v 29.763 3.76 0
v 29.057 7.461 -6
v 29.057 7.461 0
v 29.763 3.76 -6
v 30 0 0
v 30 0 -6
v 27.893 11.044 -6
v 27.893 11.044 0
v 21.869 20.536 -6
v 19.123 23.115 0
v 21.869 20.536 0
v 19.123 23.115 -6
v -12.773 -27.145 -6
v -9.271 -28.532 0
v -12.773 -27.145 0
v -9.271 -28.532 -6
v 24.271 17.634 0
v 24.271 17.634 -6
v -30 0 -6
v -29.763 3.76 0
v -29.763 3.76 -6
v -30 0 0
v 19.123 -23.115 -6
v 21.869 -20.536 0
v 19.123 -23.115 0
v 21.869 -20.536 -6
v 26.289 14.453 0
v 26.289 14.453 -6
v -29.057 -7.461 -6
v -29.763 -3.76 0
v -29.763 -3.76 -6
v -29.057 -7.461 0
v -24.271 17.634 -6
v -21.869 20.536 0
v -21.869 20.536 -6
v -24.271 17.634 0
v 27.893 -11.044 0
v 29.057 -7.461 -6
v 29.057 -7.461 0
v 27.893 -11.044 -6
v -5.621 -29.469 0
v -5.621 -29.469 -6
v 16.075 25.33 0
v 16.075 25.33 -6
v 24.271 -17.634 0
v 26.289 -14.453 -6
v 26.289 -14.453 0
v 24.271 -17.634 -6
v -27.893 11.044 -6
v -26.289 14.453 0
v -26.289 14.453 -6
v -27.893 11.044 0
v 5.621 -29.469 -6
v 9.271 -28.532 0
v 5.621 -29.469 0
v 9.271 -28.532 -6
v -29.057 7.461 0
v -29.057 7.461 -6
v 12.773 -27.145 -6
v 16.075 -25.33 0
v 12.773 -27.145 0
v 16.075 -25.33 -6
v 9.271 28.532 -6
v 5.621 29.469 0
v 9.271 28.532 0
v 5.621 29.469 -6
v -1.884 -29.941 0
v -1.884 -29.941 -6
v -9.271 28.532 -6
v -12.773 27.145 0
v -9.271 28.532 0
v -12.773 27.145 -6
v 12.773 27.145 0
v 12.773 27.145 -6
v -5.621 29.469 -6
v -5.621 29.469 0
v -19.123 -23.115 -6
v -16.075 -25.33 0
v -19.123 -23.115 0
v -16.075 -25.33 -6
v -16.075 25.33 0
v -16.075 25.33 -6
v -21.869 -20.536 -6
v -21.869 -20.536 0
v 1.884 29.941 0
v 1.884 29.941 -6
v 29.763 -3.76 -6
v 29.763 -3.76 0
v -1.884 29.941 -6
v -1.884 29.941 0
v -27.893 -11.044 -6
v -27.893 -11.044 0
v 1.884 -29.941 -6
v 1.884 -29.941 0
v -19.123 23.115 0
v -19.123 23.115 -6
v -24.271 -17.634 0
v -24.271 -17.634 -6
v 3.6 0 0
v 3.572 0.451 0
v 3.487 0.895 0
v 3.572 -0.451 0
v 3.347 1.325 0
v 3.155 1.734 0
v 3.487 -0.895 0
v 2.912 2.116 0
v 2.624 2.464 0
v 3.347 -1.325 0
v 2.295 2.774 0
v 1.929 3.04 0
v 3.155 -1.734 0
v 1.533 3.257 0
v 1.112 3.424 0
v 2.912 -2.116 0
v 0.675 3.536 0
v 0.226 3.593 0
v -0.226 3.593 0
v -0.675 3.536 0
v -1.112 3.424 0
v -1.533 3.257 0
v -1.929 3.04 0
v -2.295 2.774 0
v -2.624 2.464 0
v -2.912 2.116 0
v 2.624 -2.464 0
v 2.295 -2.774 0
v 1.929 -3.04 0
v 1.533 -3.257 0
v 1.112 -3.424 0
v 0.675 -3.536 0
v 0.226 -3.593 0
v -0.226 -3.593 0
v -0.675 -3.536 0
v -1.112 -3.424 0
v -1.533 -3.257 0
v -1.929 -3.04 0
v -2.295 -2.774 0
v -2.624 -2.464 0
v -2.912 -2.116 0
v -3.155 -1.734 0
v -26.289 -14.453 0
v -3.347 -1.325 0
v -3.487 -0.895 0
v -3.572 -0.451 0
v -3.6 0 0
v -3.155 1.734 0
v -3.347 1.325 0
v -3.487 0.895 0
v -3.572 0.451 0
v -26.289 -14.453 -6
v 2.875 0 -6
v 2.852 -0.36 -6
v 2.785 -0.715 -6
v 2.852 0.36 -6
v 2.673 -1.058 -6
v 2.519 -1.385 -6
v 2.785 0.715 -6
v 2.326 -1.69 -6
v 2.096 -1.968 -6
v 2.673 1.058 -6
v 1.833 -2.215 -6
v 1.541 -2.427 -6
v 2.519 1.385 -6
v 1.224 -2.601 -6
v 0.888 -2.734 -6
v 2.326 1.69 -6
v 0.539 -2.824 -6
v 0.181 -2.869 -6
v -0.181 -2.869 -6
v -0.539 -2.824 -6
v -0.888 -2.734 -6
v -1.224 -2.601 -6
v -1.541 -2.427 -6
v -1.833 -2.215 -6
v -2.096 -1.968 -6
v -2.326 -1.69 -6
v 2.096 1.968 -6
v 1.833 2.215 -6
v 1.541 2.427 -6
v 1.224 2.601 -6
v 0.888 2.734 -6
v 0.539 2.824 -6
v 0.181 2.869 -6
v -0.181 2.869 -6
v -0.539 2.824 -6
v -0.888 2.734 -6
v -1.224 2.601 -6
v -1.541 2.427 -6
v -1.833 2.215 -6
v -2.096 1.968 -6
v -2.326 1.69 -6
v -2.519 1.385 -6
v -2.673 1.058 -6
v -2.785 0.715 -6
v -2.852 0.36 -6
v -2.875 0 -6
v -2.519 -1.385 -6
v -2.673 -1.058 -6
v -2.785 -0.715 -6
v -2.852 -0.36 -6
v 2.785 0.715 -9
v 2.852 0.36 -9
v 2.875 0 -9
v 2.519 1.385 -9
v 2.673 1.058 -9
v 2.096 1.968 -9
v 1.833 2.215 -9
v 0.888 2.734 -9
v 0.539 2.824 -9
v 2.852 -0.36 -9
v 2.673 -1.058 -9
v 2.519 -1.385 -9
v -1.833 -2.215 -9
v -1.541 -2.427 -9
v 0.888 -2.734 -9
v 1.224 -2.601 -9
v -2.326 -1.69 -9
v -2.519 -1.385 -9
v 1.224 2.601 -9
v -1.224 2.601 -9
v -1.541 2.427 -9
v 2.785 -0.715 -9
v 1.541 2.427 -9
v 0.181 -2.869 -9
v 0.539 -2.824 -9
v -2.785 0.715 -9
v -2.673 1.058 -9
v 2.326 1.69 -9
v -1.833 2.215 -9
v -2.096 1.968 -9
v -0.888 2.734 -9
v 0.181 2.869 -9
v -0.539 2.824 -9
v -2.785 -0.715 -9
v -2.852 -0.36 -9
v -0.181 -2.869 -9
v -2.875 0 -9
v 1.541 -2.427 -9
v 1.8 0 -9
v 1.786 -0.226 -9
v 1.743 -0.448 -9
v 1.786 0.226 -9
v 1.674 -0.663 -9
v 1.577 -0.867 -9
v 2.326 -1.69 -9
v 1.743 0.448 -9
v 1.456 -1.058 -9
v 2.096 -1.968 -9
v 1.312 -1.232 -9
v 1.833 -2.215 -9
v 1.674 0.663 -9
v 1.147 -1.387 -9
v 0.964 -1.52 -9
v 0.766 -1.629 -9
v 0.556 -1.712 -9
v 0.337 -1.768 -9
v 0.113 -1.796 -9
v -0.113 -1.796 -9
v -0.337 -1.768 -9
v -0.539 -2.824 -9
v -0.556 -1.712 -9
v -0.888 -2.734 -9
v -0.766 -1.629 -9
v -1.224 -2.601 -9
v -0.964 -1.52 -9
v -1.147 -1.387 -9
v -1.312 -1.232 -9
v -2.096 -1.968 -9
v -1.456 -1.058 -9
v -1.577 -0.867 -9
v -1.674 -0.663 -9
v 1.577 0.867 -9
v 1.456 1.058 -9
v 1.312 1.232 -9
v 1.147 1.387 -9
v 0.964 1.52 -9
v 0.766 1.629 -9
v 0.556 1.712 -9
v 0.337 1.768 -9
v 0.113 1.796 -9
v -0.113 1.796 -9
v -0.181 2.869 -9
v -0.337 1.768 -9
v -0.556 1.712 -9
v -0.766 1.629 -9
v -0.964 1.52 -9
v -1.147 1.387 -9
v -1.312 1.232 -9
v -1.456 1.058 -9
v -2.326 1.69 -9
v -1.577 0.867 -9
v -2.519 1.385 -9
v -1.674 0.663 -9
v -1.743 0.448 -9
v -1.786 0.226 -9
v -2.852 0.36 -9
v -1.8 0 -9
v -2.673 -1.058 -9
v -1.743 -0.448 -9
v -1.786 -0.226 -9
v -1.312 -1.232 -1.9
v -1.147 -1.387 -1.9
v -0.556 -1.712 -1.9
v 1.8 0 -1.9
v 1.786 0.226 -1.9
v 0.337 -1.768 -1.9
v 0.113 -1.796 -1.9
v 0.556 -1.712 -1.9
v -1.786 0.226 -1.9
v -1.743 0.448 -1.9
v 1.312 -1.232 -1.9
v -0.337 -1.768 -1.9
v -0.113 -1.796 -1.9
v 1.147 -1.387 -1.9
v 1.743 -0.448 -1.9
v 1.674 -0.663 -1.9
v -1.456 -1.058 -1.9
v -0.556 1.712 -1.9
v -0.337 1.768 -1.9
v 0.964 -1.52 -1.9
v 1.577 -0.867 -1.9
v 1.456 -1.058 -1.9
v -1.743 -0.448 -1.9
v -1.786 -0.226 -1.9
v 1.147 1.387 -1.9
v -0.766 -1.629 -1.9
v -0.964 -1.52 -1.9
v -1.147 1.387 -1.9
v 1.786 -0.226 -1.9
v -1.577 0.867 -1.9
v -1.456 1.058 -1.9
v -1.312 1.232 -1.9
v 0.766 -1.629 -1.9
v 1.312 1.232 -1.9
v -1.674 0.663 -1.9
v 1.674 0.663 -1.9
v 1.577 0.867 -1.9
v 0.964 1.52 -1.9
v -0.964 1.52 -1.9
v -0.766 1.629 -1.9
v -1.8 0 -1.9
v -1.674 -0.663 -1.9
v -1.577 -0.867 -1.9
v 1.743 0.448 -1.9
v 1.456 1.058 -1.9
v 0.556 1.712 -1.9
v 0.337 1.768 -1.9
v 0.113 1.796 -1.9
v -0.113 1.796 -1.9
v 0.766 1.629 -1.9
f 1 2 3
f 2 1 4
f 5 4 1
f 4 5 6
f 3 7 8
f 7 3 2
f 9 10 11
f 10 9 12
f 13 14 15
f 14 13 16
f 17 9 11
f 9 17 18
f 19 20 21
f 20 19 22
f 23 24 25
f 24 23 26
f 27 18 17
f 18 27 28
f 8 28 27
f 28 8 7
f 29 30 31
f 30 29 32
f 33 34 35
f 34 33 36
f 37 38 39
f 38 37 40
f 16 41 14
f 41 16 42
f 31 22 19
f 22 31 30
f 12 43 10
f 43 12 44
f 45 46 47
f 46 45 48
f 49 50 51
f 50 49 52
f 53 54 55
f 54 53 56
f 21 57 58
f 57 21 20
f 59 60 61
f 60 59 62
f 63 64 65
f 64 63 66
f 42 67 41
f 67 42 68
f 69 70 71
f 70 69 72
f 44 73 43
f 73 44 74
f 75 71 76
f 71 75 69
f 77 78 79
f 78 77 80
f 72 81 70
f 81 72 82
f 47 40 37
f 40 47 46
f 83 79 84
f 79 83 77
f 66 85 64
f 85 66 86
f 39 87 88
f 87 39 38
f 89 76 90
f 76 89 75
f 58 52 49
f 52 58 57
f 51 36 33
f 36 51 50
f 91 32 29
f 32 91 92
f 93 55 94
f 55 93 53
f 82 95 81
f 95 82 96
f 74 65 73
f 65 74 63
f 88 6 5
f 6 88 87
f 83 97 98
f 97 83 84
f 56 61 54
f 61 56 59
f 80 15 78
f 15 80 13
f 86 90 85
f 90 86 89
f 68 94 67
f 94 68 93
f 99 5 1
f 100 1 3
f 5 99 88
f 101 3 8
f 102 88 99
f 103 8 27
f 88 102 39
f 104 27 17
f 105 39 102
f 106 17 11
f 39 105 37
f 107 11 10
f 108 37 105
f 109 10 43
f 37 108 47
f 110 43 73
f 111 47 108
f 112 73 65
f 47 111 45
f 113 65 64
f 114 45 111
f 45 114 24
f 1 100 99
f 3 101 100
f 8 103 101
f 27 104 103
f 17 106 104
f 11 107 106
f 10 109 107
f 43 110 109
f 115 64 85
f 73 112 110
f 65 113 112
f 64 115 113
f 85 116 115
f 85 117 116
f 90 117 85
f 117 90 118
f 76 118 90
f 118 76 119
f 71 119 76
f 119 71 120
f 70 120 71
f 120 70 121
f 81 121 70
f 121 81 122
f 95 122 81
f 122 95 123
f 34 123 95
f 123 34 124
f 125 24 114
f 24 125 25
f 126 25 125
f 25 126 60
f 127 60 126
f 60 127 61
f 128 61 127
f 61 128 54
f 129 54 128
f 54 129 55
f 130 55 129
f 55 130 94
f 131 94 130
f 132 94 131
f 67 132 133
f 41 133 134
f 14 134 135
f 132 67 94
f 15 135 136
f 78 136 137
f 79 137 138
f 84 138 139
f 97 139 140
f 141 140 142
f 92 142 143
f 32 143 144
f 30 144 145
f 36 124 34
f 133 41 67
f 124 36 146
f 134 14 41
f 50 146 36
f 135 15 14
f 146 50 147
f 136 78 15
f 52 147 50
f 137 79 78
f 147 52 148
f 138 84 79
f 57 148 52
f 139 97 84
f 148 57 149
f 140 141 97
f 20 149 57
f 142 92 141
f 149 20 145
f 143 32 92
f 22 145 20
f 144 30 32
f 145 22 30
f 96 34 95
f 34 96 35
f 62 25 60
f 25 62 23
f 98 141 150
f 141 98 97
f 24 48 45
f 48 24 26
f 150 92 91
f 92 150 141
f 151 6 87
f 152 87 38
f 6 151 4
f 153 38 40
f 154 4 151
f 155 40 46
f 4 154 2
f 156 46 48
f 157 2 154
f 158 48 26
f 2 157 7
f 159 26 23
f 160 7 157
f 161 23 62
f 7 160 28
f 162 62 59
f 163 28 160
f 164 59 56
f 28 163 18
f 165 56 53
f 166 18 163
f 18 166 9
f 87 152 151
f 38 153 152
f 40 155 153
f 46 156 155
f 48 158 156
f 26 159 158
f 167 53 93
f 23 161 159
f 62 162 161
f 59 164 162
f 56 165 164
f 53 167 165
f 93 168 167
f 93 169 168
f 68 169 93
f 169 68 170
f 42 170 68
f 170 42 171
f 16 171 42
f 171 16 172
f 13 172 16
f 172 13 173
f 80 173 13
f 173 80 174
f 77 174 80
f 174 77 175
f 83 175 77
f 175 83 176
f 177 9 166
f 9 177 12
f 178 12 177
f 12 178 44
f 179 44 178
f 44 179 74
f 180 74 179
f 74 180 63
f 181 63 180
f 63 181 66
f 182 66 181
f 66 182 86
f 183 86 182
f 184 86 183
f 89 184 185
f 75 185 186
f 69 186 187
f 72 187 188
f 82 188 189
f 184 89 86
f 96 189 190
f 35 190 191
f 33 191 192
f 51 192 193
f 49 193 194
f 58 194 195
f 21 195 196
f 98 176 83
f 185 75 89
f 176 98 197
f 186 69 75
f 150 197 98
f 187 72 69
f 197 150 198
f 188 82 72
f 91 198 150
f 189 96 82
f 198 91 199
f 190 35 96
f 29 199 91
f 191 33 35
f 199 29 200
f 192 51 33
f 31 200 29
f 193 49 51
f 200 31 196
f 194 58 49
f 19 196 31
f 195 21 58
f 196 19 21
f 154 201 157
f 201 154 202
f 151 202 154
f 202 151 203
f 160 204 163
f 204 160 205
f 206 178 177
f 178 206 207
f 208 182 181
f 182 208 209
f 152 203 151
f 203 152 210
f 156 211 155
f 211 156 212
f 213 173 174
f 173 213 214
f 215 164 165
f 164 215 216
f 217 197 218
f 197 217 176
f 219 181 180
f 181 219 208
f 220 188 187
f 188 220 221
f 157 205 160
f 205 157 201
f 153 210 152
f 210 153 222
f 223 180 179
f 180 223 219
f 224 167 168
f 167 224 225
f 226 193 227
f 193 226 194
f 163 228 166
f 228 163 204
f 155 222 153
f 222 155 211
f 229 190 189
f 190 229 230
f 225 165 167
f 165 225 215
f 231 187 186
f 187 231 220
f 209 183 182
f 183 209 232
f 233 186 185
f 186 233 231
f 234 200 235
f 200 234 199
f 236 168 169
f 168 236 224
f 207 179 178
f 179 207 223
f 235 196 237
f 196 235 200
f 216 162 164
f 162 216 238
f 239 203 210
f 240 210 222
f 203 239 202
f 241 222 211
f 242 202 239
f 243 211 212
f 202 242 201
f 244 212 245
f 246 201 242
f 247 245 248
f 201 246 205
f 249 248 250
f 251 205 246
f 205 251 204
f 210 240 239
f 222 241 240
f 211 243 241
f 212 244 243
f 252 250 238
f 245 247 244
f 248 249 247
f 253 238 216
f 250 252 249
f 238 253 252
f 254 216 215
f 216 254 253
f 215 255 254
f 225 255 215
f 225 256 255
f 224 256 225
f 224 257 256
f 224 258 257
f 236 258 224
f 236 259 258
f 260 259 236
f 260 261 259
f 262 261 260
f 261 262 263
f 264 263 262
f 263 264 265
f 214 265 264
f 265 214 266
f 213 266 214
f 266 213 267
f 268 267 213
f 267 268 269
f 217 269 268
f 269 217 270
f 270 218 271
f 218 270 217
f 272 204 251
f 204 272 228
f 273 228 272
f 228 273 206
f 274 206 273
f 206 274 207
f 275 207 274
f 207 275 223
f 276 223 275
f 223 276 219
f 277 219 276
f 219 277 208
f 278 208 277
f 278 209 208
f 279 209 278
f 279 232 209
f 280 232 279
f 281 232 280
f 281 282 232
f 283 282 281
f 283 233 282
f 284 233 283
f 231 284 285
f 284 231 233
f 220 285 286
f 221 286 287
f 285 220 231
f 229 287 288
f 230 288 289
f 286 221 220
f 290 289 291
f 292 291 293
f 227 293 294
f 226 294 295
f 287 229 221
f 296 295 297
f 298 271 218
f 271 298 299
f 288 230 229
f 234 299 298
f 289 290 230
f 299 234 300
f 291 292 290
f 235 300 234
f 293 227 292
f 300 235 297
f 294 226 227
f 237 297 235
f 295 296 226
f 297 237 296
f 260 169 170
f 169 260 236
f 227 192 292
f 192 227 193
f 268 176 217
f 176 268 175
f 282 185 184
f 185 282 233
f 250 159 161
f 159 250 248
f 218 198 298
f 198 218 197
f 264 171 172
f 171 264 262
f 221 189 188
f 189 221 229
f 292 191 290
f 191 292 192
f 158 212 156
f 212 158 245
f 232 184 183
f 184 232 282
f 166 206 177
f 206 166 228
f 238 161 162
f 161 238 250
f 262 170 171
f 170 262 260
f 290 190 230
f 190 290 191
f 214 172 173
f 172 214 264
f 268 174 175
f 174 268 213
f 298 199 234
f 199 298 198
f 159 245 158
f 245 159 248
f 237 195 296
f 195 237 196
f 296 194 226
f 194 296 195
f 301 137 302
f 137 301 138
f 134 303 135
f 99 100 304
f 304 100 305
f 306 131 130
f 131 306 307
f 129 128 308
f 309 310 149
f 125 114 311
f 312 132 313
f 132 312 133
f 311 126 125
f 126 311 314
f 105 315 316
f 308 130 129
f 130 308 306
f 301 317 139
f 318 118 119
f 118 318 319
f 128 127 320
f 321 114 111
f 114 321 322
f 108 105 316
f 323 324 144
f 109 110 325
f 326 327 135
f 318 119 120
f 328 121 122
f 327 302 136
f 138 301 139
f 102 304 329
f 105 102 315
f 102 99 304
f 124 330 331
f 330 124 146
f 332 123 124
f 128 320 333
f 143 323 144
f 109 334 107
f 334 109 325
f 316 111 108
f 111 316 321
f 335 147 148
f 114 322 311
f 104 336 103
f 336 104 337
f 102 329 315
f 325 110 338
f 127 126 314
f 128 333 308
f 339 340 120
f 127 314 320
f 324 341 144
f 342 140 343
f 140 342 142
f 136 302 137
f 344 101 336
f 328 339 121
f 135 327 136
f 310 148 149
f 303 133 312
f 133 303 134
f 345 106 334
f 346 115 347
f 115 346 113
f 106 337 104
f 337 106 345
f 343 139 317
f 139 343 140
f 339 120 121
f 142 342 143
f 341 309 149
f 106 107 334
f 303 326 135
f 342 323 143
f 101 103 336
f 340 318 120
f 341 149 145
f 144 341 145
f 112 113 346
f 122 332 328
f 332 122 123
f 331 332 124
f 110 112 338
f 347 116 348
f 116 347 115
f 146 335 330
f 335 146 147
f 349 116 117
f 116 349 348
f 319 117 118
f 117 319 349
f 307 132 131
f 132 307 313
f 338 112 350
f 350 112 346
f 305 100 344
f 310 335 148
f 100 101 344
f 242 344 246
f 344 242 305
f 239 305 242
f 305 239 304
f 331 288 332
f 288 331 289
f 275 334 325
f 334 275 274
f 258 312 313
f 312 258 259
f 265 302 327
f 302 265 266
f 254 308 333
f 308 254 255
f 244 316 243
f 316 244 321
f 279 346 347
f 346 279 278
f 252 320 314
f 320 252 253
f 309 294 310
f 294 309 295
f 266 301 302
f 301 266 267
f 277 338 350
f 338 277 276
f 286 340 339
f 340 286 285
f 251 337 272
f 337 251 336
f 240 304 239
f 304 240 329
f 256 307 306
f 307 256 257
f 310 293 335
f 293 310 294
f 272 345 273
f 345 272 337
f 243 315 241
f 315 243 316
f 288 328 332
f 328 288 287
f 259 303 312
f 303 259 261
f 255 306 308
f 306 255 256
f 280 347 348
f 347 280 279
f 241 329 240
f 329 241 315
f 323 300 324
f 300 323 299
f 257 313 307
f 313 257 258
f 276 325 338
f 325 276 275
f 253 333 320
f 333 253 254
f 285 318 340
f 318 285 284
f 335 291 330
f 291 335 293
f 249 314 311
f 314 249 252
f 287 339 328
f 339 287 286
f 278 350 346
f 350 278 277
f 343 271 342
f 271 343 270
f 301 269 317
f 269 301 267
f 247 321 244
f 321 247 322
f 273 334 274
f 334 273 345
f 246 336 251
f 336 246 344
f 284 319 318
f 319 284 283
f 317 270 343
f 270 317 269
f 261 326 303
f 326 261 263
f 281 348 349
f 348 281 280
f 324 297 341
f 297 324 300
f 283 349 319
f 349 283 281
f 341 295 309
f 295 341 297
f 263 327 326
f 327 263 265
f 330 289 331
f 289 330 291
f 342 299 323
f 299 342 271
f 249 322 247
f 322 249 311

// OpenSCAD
$fn = 50;

difference() {
	union() {
		translate(v = [0, 0, -6.0]) {
			cylinder(h = 6, r = 30.0);
		}
		#translate(v = [0, 0, -9.0]) {
			cylinder(h = 9, r = 2.875);
		}
	}
	union() {
		translate(v = [0, 0, 0]) {
			rotate(a = [0, 0, 0]) {
				difference() {
					union() {
						translate(v = [0, 0, -9.0]) {
							cylinder(h = 9, r = 1.5);
						}
						translate(v = [0, 0, -1.9]) {
							cylinder(h = 1.9, r1 = 1.8, r2 = 3.6);
						}
						translate(v = [0, 0, -9.0]) {
							cylinder(h = 9, r = 1.8);
						}
						translate(v = [0, 0, -9.0]) {
							cylinder(h = 9, r = 1.5);
						}
					}
					union();
				}
			}
		}
	}
}
